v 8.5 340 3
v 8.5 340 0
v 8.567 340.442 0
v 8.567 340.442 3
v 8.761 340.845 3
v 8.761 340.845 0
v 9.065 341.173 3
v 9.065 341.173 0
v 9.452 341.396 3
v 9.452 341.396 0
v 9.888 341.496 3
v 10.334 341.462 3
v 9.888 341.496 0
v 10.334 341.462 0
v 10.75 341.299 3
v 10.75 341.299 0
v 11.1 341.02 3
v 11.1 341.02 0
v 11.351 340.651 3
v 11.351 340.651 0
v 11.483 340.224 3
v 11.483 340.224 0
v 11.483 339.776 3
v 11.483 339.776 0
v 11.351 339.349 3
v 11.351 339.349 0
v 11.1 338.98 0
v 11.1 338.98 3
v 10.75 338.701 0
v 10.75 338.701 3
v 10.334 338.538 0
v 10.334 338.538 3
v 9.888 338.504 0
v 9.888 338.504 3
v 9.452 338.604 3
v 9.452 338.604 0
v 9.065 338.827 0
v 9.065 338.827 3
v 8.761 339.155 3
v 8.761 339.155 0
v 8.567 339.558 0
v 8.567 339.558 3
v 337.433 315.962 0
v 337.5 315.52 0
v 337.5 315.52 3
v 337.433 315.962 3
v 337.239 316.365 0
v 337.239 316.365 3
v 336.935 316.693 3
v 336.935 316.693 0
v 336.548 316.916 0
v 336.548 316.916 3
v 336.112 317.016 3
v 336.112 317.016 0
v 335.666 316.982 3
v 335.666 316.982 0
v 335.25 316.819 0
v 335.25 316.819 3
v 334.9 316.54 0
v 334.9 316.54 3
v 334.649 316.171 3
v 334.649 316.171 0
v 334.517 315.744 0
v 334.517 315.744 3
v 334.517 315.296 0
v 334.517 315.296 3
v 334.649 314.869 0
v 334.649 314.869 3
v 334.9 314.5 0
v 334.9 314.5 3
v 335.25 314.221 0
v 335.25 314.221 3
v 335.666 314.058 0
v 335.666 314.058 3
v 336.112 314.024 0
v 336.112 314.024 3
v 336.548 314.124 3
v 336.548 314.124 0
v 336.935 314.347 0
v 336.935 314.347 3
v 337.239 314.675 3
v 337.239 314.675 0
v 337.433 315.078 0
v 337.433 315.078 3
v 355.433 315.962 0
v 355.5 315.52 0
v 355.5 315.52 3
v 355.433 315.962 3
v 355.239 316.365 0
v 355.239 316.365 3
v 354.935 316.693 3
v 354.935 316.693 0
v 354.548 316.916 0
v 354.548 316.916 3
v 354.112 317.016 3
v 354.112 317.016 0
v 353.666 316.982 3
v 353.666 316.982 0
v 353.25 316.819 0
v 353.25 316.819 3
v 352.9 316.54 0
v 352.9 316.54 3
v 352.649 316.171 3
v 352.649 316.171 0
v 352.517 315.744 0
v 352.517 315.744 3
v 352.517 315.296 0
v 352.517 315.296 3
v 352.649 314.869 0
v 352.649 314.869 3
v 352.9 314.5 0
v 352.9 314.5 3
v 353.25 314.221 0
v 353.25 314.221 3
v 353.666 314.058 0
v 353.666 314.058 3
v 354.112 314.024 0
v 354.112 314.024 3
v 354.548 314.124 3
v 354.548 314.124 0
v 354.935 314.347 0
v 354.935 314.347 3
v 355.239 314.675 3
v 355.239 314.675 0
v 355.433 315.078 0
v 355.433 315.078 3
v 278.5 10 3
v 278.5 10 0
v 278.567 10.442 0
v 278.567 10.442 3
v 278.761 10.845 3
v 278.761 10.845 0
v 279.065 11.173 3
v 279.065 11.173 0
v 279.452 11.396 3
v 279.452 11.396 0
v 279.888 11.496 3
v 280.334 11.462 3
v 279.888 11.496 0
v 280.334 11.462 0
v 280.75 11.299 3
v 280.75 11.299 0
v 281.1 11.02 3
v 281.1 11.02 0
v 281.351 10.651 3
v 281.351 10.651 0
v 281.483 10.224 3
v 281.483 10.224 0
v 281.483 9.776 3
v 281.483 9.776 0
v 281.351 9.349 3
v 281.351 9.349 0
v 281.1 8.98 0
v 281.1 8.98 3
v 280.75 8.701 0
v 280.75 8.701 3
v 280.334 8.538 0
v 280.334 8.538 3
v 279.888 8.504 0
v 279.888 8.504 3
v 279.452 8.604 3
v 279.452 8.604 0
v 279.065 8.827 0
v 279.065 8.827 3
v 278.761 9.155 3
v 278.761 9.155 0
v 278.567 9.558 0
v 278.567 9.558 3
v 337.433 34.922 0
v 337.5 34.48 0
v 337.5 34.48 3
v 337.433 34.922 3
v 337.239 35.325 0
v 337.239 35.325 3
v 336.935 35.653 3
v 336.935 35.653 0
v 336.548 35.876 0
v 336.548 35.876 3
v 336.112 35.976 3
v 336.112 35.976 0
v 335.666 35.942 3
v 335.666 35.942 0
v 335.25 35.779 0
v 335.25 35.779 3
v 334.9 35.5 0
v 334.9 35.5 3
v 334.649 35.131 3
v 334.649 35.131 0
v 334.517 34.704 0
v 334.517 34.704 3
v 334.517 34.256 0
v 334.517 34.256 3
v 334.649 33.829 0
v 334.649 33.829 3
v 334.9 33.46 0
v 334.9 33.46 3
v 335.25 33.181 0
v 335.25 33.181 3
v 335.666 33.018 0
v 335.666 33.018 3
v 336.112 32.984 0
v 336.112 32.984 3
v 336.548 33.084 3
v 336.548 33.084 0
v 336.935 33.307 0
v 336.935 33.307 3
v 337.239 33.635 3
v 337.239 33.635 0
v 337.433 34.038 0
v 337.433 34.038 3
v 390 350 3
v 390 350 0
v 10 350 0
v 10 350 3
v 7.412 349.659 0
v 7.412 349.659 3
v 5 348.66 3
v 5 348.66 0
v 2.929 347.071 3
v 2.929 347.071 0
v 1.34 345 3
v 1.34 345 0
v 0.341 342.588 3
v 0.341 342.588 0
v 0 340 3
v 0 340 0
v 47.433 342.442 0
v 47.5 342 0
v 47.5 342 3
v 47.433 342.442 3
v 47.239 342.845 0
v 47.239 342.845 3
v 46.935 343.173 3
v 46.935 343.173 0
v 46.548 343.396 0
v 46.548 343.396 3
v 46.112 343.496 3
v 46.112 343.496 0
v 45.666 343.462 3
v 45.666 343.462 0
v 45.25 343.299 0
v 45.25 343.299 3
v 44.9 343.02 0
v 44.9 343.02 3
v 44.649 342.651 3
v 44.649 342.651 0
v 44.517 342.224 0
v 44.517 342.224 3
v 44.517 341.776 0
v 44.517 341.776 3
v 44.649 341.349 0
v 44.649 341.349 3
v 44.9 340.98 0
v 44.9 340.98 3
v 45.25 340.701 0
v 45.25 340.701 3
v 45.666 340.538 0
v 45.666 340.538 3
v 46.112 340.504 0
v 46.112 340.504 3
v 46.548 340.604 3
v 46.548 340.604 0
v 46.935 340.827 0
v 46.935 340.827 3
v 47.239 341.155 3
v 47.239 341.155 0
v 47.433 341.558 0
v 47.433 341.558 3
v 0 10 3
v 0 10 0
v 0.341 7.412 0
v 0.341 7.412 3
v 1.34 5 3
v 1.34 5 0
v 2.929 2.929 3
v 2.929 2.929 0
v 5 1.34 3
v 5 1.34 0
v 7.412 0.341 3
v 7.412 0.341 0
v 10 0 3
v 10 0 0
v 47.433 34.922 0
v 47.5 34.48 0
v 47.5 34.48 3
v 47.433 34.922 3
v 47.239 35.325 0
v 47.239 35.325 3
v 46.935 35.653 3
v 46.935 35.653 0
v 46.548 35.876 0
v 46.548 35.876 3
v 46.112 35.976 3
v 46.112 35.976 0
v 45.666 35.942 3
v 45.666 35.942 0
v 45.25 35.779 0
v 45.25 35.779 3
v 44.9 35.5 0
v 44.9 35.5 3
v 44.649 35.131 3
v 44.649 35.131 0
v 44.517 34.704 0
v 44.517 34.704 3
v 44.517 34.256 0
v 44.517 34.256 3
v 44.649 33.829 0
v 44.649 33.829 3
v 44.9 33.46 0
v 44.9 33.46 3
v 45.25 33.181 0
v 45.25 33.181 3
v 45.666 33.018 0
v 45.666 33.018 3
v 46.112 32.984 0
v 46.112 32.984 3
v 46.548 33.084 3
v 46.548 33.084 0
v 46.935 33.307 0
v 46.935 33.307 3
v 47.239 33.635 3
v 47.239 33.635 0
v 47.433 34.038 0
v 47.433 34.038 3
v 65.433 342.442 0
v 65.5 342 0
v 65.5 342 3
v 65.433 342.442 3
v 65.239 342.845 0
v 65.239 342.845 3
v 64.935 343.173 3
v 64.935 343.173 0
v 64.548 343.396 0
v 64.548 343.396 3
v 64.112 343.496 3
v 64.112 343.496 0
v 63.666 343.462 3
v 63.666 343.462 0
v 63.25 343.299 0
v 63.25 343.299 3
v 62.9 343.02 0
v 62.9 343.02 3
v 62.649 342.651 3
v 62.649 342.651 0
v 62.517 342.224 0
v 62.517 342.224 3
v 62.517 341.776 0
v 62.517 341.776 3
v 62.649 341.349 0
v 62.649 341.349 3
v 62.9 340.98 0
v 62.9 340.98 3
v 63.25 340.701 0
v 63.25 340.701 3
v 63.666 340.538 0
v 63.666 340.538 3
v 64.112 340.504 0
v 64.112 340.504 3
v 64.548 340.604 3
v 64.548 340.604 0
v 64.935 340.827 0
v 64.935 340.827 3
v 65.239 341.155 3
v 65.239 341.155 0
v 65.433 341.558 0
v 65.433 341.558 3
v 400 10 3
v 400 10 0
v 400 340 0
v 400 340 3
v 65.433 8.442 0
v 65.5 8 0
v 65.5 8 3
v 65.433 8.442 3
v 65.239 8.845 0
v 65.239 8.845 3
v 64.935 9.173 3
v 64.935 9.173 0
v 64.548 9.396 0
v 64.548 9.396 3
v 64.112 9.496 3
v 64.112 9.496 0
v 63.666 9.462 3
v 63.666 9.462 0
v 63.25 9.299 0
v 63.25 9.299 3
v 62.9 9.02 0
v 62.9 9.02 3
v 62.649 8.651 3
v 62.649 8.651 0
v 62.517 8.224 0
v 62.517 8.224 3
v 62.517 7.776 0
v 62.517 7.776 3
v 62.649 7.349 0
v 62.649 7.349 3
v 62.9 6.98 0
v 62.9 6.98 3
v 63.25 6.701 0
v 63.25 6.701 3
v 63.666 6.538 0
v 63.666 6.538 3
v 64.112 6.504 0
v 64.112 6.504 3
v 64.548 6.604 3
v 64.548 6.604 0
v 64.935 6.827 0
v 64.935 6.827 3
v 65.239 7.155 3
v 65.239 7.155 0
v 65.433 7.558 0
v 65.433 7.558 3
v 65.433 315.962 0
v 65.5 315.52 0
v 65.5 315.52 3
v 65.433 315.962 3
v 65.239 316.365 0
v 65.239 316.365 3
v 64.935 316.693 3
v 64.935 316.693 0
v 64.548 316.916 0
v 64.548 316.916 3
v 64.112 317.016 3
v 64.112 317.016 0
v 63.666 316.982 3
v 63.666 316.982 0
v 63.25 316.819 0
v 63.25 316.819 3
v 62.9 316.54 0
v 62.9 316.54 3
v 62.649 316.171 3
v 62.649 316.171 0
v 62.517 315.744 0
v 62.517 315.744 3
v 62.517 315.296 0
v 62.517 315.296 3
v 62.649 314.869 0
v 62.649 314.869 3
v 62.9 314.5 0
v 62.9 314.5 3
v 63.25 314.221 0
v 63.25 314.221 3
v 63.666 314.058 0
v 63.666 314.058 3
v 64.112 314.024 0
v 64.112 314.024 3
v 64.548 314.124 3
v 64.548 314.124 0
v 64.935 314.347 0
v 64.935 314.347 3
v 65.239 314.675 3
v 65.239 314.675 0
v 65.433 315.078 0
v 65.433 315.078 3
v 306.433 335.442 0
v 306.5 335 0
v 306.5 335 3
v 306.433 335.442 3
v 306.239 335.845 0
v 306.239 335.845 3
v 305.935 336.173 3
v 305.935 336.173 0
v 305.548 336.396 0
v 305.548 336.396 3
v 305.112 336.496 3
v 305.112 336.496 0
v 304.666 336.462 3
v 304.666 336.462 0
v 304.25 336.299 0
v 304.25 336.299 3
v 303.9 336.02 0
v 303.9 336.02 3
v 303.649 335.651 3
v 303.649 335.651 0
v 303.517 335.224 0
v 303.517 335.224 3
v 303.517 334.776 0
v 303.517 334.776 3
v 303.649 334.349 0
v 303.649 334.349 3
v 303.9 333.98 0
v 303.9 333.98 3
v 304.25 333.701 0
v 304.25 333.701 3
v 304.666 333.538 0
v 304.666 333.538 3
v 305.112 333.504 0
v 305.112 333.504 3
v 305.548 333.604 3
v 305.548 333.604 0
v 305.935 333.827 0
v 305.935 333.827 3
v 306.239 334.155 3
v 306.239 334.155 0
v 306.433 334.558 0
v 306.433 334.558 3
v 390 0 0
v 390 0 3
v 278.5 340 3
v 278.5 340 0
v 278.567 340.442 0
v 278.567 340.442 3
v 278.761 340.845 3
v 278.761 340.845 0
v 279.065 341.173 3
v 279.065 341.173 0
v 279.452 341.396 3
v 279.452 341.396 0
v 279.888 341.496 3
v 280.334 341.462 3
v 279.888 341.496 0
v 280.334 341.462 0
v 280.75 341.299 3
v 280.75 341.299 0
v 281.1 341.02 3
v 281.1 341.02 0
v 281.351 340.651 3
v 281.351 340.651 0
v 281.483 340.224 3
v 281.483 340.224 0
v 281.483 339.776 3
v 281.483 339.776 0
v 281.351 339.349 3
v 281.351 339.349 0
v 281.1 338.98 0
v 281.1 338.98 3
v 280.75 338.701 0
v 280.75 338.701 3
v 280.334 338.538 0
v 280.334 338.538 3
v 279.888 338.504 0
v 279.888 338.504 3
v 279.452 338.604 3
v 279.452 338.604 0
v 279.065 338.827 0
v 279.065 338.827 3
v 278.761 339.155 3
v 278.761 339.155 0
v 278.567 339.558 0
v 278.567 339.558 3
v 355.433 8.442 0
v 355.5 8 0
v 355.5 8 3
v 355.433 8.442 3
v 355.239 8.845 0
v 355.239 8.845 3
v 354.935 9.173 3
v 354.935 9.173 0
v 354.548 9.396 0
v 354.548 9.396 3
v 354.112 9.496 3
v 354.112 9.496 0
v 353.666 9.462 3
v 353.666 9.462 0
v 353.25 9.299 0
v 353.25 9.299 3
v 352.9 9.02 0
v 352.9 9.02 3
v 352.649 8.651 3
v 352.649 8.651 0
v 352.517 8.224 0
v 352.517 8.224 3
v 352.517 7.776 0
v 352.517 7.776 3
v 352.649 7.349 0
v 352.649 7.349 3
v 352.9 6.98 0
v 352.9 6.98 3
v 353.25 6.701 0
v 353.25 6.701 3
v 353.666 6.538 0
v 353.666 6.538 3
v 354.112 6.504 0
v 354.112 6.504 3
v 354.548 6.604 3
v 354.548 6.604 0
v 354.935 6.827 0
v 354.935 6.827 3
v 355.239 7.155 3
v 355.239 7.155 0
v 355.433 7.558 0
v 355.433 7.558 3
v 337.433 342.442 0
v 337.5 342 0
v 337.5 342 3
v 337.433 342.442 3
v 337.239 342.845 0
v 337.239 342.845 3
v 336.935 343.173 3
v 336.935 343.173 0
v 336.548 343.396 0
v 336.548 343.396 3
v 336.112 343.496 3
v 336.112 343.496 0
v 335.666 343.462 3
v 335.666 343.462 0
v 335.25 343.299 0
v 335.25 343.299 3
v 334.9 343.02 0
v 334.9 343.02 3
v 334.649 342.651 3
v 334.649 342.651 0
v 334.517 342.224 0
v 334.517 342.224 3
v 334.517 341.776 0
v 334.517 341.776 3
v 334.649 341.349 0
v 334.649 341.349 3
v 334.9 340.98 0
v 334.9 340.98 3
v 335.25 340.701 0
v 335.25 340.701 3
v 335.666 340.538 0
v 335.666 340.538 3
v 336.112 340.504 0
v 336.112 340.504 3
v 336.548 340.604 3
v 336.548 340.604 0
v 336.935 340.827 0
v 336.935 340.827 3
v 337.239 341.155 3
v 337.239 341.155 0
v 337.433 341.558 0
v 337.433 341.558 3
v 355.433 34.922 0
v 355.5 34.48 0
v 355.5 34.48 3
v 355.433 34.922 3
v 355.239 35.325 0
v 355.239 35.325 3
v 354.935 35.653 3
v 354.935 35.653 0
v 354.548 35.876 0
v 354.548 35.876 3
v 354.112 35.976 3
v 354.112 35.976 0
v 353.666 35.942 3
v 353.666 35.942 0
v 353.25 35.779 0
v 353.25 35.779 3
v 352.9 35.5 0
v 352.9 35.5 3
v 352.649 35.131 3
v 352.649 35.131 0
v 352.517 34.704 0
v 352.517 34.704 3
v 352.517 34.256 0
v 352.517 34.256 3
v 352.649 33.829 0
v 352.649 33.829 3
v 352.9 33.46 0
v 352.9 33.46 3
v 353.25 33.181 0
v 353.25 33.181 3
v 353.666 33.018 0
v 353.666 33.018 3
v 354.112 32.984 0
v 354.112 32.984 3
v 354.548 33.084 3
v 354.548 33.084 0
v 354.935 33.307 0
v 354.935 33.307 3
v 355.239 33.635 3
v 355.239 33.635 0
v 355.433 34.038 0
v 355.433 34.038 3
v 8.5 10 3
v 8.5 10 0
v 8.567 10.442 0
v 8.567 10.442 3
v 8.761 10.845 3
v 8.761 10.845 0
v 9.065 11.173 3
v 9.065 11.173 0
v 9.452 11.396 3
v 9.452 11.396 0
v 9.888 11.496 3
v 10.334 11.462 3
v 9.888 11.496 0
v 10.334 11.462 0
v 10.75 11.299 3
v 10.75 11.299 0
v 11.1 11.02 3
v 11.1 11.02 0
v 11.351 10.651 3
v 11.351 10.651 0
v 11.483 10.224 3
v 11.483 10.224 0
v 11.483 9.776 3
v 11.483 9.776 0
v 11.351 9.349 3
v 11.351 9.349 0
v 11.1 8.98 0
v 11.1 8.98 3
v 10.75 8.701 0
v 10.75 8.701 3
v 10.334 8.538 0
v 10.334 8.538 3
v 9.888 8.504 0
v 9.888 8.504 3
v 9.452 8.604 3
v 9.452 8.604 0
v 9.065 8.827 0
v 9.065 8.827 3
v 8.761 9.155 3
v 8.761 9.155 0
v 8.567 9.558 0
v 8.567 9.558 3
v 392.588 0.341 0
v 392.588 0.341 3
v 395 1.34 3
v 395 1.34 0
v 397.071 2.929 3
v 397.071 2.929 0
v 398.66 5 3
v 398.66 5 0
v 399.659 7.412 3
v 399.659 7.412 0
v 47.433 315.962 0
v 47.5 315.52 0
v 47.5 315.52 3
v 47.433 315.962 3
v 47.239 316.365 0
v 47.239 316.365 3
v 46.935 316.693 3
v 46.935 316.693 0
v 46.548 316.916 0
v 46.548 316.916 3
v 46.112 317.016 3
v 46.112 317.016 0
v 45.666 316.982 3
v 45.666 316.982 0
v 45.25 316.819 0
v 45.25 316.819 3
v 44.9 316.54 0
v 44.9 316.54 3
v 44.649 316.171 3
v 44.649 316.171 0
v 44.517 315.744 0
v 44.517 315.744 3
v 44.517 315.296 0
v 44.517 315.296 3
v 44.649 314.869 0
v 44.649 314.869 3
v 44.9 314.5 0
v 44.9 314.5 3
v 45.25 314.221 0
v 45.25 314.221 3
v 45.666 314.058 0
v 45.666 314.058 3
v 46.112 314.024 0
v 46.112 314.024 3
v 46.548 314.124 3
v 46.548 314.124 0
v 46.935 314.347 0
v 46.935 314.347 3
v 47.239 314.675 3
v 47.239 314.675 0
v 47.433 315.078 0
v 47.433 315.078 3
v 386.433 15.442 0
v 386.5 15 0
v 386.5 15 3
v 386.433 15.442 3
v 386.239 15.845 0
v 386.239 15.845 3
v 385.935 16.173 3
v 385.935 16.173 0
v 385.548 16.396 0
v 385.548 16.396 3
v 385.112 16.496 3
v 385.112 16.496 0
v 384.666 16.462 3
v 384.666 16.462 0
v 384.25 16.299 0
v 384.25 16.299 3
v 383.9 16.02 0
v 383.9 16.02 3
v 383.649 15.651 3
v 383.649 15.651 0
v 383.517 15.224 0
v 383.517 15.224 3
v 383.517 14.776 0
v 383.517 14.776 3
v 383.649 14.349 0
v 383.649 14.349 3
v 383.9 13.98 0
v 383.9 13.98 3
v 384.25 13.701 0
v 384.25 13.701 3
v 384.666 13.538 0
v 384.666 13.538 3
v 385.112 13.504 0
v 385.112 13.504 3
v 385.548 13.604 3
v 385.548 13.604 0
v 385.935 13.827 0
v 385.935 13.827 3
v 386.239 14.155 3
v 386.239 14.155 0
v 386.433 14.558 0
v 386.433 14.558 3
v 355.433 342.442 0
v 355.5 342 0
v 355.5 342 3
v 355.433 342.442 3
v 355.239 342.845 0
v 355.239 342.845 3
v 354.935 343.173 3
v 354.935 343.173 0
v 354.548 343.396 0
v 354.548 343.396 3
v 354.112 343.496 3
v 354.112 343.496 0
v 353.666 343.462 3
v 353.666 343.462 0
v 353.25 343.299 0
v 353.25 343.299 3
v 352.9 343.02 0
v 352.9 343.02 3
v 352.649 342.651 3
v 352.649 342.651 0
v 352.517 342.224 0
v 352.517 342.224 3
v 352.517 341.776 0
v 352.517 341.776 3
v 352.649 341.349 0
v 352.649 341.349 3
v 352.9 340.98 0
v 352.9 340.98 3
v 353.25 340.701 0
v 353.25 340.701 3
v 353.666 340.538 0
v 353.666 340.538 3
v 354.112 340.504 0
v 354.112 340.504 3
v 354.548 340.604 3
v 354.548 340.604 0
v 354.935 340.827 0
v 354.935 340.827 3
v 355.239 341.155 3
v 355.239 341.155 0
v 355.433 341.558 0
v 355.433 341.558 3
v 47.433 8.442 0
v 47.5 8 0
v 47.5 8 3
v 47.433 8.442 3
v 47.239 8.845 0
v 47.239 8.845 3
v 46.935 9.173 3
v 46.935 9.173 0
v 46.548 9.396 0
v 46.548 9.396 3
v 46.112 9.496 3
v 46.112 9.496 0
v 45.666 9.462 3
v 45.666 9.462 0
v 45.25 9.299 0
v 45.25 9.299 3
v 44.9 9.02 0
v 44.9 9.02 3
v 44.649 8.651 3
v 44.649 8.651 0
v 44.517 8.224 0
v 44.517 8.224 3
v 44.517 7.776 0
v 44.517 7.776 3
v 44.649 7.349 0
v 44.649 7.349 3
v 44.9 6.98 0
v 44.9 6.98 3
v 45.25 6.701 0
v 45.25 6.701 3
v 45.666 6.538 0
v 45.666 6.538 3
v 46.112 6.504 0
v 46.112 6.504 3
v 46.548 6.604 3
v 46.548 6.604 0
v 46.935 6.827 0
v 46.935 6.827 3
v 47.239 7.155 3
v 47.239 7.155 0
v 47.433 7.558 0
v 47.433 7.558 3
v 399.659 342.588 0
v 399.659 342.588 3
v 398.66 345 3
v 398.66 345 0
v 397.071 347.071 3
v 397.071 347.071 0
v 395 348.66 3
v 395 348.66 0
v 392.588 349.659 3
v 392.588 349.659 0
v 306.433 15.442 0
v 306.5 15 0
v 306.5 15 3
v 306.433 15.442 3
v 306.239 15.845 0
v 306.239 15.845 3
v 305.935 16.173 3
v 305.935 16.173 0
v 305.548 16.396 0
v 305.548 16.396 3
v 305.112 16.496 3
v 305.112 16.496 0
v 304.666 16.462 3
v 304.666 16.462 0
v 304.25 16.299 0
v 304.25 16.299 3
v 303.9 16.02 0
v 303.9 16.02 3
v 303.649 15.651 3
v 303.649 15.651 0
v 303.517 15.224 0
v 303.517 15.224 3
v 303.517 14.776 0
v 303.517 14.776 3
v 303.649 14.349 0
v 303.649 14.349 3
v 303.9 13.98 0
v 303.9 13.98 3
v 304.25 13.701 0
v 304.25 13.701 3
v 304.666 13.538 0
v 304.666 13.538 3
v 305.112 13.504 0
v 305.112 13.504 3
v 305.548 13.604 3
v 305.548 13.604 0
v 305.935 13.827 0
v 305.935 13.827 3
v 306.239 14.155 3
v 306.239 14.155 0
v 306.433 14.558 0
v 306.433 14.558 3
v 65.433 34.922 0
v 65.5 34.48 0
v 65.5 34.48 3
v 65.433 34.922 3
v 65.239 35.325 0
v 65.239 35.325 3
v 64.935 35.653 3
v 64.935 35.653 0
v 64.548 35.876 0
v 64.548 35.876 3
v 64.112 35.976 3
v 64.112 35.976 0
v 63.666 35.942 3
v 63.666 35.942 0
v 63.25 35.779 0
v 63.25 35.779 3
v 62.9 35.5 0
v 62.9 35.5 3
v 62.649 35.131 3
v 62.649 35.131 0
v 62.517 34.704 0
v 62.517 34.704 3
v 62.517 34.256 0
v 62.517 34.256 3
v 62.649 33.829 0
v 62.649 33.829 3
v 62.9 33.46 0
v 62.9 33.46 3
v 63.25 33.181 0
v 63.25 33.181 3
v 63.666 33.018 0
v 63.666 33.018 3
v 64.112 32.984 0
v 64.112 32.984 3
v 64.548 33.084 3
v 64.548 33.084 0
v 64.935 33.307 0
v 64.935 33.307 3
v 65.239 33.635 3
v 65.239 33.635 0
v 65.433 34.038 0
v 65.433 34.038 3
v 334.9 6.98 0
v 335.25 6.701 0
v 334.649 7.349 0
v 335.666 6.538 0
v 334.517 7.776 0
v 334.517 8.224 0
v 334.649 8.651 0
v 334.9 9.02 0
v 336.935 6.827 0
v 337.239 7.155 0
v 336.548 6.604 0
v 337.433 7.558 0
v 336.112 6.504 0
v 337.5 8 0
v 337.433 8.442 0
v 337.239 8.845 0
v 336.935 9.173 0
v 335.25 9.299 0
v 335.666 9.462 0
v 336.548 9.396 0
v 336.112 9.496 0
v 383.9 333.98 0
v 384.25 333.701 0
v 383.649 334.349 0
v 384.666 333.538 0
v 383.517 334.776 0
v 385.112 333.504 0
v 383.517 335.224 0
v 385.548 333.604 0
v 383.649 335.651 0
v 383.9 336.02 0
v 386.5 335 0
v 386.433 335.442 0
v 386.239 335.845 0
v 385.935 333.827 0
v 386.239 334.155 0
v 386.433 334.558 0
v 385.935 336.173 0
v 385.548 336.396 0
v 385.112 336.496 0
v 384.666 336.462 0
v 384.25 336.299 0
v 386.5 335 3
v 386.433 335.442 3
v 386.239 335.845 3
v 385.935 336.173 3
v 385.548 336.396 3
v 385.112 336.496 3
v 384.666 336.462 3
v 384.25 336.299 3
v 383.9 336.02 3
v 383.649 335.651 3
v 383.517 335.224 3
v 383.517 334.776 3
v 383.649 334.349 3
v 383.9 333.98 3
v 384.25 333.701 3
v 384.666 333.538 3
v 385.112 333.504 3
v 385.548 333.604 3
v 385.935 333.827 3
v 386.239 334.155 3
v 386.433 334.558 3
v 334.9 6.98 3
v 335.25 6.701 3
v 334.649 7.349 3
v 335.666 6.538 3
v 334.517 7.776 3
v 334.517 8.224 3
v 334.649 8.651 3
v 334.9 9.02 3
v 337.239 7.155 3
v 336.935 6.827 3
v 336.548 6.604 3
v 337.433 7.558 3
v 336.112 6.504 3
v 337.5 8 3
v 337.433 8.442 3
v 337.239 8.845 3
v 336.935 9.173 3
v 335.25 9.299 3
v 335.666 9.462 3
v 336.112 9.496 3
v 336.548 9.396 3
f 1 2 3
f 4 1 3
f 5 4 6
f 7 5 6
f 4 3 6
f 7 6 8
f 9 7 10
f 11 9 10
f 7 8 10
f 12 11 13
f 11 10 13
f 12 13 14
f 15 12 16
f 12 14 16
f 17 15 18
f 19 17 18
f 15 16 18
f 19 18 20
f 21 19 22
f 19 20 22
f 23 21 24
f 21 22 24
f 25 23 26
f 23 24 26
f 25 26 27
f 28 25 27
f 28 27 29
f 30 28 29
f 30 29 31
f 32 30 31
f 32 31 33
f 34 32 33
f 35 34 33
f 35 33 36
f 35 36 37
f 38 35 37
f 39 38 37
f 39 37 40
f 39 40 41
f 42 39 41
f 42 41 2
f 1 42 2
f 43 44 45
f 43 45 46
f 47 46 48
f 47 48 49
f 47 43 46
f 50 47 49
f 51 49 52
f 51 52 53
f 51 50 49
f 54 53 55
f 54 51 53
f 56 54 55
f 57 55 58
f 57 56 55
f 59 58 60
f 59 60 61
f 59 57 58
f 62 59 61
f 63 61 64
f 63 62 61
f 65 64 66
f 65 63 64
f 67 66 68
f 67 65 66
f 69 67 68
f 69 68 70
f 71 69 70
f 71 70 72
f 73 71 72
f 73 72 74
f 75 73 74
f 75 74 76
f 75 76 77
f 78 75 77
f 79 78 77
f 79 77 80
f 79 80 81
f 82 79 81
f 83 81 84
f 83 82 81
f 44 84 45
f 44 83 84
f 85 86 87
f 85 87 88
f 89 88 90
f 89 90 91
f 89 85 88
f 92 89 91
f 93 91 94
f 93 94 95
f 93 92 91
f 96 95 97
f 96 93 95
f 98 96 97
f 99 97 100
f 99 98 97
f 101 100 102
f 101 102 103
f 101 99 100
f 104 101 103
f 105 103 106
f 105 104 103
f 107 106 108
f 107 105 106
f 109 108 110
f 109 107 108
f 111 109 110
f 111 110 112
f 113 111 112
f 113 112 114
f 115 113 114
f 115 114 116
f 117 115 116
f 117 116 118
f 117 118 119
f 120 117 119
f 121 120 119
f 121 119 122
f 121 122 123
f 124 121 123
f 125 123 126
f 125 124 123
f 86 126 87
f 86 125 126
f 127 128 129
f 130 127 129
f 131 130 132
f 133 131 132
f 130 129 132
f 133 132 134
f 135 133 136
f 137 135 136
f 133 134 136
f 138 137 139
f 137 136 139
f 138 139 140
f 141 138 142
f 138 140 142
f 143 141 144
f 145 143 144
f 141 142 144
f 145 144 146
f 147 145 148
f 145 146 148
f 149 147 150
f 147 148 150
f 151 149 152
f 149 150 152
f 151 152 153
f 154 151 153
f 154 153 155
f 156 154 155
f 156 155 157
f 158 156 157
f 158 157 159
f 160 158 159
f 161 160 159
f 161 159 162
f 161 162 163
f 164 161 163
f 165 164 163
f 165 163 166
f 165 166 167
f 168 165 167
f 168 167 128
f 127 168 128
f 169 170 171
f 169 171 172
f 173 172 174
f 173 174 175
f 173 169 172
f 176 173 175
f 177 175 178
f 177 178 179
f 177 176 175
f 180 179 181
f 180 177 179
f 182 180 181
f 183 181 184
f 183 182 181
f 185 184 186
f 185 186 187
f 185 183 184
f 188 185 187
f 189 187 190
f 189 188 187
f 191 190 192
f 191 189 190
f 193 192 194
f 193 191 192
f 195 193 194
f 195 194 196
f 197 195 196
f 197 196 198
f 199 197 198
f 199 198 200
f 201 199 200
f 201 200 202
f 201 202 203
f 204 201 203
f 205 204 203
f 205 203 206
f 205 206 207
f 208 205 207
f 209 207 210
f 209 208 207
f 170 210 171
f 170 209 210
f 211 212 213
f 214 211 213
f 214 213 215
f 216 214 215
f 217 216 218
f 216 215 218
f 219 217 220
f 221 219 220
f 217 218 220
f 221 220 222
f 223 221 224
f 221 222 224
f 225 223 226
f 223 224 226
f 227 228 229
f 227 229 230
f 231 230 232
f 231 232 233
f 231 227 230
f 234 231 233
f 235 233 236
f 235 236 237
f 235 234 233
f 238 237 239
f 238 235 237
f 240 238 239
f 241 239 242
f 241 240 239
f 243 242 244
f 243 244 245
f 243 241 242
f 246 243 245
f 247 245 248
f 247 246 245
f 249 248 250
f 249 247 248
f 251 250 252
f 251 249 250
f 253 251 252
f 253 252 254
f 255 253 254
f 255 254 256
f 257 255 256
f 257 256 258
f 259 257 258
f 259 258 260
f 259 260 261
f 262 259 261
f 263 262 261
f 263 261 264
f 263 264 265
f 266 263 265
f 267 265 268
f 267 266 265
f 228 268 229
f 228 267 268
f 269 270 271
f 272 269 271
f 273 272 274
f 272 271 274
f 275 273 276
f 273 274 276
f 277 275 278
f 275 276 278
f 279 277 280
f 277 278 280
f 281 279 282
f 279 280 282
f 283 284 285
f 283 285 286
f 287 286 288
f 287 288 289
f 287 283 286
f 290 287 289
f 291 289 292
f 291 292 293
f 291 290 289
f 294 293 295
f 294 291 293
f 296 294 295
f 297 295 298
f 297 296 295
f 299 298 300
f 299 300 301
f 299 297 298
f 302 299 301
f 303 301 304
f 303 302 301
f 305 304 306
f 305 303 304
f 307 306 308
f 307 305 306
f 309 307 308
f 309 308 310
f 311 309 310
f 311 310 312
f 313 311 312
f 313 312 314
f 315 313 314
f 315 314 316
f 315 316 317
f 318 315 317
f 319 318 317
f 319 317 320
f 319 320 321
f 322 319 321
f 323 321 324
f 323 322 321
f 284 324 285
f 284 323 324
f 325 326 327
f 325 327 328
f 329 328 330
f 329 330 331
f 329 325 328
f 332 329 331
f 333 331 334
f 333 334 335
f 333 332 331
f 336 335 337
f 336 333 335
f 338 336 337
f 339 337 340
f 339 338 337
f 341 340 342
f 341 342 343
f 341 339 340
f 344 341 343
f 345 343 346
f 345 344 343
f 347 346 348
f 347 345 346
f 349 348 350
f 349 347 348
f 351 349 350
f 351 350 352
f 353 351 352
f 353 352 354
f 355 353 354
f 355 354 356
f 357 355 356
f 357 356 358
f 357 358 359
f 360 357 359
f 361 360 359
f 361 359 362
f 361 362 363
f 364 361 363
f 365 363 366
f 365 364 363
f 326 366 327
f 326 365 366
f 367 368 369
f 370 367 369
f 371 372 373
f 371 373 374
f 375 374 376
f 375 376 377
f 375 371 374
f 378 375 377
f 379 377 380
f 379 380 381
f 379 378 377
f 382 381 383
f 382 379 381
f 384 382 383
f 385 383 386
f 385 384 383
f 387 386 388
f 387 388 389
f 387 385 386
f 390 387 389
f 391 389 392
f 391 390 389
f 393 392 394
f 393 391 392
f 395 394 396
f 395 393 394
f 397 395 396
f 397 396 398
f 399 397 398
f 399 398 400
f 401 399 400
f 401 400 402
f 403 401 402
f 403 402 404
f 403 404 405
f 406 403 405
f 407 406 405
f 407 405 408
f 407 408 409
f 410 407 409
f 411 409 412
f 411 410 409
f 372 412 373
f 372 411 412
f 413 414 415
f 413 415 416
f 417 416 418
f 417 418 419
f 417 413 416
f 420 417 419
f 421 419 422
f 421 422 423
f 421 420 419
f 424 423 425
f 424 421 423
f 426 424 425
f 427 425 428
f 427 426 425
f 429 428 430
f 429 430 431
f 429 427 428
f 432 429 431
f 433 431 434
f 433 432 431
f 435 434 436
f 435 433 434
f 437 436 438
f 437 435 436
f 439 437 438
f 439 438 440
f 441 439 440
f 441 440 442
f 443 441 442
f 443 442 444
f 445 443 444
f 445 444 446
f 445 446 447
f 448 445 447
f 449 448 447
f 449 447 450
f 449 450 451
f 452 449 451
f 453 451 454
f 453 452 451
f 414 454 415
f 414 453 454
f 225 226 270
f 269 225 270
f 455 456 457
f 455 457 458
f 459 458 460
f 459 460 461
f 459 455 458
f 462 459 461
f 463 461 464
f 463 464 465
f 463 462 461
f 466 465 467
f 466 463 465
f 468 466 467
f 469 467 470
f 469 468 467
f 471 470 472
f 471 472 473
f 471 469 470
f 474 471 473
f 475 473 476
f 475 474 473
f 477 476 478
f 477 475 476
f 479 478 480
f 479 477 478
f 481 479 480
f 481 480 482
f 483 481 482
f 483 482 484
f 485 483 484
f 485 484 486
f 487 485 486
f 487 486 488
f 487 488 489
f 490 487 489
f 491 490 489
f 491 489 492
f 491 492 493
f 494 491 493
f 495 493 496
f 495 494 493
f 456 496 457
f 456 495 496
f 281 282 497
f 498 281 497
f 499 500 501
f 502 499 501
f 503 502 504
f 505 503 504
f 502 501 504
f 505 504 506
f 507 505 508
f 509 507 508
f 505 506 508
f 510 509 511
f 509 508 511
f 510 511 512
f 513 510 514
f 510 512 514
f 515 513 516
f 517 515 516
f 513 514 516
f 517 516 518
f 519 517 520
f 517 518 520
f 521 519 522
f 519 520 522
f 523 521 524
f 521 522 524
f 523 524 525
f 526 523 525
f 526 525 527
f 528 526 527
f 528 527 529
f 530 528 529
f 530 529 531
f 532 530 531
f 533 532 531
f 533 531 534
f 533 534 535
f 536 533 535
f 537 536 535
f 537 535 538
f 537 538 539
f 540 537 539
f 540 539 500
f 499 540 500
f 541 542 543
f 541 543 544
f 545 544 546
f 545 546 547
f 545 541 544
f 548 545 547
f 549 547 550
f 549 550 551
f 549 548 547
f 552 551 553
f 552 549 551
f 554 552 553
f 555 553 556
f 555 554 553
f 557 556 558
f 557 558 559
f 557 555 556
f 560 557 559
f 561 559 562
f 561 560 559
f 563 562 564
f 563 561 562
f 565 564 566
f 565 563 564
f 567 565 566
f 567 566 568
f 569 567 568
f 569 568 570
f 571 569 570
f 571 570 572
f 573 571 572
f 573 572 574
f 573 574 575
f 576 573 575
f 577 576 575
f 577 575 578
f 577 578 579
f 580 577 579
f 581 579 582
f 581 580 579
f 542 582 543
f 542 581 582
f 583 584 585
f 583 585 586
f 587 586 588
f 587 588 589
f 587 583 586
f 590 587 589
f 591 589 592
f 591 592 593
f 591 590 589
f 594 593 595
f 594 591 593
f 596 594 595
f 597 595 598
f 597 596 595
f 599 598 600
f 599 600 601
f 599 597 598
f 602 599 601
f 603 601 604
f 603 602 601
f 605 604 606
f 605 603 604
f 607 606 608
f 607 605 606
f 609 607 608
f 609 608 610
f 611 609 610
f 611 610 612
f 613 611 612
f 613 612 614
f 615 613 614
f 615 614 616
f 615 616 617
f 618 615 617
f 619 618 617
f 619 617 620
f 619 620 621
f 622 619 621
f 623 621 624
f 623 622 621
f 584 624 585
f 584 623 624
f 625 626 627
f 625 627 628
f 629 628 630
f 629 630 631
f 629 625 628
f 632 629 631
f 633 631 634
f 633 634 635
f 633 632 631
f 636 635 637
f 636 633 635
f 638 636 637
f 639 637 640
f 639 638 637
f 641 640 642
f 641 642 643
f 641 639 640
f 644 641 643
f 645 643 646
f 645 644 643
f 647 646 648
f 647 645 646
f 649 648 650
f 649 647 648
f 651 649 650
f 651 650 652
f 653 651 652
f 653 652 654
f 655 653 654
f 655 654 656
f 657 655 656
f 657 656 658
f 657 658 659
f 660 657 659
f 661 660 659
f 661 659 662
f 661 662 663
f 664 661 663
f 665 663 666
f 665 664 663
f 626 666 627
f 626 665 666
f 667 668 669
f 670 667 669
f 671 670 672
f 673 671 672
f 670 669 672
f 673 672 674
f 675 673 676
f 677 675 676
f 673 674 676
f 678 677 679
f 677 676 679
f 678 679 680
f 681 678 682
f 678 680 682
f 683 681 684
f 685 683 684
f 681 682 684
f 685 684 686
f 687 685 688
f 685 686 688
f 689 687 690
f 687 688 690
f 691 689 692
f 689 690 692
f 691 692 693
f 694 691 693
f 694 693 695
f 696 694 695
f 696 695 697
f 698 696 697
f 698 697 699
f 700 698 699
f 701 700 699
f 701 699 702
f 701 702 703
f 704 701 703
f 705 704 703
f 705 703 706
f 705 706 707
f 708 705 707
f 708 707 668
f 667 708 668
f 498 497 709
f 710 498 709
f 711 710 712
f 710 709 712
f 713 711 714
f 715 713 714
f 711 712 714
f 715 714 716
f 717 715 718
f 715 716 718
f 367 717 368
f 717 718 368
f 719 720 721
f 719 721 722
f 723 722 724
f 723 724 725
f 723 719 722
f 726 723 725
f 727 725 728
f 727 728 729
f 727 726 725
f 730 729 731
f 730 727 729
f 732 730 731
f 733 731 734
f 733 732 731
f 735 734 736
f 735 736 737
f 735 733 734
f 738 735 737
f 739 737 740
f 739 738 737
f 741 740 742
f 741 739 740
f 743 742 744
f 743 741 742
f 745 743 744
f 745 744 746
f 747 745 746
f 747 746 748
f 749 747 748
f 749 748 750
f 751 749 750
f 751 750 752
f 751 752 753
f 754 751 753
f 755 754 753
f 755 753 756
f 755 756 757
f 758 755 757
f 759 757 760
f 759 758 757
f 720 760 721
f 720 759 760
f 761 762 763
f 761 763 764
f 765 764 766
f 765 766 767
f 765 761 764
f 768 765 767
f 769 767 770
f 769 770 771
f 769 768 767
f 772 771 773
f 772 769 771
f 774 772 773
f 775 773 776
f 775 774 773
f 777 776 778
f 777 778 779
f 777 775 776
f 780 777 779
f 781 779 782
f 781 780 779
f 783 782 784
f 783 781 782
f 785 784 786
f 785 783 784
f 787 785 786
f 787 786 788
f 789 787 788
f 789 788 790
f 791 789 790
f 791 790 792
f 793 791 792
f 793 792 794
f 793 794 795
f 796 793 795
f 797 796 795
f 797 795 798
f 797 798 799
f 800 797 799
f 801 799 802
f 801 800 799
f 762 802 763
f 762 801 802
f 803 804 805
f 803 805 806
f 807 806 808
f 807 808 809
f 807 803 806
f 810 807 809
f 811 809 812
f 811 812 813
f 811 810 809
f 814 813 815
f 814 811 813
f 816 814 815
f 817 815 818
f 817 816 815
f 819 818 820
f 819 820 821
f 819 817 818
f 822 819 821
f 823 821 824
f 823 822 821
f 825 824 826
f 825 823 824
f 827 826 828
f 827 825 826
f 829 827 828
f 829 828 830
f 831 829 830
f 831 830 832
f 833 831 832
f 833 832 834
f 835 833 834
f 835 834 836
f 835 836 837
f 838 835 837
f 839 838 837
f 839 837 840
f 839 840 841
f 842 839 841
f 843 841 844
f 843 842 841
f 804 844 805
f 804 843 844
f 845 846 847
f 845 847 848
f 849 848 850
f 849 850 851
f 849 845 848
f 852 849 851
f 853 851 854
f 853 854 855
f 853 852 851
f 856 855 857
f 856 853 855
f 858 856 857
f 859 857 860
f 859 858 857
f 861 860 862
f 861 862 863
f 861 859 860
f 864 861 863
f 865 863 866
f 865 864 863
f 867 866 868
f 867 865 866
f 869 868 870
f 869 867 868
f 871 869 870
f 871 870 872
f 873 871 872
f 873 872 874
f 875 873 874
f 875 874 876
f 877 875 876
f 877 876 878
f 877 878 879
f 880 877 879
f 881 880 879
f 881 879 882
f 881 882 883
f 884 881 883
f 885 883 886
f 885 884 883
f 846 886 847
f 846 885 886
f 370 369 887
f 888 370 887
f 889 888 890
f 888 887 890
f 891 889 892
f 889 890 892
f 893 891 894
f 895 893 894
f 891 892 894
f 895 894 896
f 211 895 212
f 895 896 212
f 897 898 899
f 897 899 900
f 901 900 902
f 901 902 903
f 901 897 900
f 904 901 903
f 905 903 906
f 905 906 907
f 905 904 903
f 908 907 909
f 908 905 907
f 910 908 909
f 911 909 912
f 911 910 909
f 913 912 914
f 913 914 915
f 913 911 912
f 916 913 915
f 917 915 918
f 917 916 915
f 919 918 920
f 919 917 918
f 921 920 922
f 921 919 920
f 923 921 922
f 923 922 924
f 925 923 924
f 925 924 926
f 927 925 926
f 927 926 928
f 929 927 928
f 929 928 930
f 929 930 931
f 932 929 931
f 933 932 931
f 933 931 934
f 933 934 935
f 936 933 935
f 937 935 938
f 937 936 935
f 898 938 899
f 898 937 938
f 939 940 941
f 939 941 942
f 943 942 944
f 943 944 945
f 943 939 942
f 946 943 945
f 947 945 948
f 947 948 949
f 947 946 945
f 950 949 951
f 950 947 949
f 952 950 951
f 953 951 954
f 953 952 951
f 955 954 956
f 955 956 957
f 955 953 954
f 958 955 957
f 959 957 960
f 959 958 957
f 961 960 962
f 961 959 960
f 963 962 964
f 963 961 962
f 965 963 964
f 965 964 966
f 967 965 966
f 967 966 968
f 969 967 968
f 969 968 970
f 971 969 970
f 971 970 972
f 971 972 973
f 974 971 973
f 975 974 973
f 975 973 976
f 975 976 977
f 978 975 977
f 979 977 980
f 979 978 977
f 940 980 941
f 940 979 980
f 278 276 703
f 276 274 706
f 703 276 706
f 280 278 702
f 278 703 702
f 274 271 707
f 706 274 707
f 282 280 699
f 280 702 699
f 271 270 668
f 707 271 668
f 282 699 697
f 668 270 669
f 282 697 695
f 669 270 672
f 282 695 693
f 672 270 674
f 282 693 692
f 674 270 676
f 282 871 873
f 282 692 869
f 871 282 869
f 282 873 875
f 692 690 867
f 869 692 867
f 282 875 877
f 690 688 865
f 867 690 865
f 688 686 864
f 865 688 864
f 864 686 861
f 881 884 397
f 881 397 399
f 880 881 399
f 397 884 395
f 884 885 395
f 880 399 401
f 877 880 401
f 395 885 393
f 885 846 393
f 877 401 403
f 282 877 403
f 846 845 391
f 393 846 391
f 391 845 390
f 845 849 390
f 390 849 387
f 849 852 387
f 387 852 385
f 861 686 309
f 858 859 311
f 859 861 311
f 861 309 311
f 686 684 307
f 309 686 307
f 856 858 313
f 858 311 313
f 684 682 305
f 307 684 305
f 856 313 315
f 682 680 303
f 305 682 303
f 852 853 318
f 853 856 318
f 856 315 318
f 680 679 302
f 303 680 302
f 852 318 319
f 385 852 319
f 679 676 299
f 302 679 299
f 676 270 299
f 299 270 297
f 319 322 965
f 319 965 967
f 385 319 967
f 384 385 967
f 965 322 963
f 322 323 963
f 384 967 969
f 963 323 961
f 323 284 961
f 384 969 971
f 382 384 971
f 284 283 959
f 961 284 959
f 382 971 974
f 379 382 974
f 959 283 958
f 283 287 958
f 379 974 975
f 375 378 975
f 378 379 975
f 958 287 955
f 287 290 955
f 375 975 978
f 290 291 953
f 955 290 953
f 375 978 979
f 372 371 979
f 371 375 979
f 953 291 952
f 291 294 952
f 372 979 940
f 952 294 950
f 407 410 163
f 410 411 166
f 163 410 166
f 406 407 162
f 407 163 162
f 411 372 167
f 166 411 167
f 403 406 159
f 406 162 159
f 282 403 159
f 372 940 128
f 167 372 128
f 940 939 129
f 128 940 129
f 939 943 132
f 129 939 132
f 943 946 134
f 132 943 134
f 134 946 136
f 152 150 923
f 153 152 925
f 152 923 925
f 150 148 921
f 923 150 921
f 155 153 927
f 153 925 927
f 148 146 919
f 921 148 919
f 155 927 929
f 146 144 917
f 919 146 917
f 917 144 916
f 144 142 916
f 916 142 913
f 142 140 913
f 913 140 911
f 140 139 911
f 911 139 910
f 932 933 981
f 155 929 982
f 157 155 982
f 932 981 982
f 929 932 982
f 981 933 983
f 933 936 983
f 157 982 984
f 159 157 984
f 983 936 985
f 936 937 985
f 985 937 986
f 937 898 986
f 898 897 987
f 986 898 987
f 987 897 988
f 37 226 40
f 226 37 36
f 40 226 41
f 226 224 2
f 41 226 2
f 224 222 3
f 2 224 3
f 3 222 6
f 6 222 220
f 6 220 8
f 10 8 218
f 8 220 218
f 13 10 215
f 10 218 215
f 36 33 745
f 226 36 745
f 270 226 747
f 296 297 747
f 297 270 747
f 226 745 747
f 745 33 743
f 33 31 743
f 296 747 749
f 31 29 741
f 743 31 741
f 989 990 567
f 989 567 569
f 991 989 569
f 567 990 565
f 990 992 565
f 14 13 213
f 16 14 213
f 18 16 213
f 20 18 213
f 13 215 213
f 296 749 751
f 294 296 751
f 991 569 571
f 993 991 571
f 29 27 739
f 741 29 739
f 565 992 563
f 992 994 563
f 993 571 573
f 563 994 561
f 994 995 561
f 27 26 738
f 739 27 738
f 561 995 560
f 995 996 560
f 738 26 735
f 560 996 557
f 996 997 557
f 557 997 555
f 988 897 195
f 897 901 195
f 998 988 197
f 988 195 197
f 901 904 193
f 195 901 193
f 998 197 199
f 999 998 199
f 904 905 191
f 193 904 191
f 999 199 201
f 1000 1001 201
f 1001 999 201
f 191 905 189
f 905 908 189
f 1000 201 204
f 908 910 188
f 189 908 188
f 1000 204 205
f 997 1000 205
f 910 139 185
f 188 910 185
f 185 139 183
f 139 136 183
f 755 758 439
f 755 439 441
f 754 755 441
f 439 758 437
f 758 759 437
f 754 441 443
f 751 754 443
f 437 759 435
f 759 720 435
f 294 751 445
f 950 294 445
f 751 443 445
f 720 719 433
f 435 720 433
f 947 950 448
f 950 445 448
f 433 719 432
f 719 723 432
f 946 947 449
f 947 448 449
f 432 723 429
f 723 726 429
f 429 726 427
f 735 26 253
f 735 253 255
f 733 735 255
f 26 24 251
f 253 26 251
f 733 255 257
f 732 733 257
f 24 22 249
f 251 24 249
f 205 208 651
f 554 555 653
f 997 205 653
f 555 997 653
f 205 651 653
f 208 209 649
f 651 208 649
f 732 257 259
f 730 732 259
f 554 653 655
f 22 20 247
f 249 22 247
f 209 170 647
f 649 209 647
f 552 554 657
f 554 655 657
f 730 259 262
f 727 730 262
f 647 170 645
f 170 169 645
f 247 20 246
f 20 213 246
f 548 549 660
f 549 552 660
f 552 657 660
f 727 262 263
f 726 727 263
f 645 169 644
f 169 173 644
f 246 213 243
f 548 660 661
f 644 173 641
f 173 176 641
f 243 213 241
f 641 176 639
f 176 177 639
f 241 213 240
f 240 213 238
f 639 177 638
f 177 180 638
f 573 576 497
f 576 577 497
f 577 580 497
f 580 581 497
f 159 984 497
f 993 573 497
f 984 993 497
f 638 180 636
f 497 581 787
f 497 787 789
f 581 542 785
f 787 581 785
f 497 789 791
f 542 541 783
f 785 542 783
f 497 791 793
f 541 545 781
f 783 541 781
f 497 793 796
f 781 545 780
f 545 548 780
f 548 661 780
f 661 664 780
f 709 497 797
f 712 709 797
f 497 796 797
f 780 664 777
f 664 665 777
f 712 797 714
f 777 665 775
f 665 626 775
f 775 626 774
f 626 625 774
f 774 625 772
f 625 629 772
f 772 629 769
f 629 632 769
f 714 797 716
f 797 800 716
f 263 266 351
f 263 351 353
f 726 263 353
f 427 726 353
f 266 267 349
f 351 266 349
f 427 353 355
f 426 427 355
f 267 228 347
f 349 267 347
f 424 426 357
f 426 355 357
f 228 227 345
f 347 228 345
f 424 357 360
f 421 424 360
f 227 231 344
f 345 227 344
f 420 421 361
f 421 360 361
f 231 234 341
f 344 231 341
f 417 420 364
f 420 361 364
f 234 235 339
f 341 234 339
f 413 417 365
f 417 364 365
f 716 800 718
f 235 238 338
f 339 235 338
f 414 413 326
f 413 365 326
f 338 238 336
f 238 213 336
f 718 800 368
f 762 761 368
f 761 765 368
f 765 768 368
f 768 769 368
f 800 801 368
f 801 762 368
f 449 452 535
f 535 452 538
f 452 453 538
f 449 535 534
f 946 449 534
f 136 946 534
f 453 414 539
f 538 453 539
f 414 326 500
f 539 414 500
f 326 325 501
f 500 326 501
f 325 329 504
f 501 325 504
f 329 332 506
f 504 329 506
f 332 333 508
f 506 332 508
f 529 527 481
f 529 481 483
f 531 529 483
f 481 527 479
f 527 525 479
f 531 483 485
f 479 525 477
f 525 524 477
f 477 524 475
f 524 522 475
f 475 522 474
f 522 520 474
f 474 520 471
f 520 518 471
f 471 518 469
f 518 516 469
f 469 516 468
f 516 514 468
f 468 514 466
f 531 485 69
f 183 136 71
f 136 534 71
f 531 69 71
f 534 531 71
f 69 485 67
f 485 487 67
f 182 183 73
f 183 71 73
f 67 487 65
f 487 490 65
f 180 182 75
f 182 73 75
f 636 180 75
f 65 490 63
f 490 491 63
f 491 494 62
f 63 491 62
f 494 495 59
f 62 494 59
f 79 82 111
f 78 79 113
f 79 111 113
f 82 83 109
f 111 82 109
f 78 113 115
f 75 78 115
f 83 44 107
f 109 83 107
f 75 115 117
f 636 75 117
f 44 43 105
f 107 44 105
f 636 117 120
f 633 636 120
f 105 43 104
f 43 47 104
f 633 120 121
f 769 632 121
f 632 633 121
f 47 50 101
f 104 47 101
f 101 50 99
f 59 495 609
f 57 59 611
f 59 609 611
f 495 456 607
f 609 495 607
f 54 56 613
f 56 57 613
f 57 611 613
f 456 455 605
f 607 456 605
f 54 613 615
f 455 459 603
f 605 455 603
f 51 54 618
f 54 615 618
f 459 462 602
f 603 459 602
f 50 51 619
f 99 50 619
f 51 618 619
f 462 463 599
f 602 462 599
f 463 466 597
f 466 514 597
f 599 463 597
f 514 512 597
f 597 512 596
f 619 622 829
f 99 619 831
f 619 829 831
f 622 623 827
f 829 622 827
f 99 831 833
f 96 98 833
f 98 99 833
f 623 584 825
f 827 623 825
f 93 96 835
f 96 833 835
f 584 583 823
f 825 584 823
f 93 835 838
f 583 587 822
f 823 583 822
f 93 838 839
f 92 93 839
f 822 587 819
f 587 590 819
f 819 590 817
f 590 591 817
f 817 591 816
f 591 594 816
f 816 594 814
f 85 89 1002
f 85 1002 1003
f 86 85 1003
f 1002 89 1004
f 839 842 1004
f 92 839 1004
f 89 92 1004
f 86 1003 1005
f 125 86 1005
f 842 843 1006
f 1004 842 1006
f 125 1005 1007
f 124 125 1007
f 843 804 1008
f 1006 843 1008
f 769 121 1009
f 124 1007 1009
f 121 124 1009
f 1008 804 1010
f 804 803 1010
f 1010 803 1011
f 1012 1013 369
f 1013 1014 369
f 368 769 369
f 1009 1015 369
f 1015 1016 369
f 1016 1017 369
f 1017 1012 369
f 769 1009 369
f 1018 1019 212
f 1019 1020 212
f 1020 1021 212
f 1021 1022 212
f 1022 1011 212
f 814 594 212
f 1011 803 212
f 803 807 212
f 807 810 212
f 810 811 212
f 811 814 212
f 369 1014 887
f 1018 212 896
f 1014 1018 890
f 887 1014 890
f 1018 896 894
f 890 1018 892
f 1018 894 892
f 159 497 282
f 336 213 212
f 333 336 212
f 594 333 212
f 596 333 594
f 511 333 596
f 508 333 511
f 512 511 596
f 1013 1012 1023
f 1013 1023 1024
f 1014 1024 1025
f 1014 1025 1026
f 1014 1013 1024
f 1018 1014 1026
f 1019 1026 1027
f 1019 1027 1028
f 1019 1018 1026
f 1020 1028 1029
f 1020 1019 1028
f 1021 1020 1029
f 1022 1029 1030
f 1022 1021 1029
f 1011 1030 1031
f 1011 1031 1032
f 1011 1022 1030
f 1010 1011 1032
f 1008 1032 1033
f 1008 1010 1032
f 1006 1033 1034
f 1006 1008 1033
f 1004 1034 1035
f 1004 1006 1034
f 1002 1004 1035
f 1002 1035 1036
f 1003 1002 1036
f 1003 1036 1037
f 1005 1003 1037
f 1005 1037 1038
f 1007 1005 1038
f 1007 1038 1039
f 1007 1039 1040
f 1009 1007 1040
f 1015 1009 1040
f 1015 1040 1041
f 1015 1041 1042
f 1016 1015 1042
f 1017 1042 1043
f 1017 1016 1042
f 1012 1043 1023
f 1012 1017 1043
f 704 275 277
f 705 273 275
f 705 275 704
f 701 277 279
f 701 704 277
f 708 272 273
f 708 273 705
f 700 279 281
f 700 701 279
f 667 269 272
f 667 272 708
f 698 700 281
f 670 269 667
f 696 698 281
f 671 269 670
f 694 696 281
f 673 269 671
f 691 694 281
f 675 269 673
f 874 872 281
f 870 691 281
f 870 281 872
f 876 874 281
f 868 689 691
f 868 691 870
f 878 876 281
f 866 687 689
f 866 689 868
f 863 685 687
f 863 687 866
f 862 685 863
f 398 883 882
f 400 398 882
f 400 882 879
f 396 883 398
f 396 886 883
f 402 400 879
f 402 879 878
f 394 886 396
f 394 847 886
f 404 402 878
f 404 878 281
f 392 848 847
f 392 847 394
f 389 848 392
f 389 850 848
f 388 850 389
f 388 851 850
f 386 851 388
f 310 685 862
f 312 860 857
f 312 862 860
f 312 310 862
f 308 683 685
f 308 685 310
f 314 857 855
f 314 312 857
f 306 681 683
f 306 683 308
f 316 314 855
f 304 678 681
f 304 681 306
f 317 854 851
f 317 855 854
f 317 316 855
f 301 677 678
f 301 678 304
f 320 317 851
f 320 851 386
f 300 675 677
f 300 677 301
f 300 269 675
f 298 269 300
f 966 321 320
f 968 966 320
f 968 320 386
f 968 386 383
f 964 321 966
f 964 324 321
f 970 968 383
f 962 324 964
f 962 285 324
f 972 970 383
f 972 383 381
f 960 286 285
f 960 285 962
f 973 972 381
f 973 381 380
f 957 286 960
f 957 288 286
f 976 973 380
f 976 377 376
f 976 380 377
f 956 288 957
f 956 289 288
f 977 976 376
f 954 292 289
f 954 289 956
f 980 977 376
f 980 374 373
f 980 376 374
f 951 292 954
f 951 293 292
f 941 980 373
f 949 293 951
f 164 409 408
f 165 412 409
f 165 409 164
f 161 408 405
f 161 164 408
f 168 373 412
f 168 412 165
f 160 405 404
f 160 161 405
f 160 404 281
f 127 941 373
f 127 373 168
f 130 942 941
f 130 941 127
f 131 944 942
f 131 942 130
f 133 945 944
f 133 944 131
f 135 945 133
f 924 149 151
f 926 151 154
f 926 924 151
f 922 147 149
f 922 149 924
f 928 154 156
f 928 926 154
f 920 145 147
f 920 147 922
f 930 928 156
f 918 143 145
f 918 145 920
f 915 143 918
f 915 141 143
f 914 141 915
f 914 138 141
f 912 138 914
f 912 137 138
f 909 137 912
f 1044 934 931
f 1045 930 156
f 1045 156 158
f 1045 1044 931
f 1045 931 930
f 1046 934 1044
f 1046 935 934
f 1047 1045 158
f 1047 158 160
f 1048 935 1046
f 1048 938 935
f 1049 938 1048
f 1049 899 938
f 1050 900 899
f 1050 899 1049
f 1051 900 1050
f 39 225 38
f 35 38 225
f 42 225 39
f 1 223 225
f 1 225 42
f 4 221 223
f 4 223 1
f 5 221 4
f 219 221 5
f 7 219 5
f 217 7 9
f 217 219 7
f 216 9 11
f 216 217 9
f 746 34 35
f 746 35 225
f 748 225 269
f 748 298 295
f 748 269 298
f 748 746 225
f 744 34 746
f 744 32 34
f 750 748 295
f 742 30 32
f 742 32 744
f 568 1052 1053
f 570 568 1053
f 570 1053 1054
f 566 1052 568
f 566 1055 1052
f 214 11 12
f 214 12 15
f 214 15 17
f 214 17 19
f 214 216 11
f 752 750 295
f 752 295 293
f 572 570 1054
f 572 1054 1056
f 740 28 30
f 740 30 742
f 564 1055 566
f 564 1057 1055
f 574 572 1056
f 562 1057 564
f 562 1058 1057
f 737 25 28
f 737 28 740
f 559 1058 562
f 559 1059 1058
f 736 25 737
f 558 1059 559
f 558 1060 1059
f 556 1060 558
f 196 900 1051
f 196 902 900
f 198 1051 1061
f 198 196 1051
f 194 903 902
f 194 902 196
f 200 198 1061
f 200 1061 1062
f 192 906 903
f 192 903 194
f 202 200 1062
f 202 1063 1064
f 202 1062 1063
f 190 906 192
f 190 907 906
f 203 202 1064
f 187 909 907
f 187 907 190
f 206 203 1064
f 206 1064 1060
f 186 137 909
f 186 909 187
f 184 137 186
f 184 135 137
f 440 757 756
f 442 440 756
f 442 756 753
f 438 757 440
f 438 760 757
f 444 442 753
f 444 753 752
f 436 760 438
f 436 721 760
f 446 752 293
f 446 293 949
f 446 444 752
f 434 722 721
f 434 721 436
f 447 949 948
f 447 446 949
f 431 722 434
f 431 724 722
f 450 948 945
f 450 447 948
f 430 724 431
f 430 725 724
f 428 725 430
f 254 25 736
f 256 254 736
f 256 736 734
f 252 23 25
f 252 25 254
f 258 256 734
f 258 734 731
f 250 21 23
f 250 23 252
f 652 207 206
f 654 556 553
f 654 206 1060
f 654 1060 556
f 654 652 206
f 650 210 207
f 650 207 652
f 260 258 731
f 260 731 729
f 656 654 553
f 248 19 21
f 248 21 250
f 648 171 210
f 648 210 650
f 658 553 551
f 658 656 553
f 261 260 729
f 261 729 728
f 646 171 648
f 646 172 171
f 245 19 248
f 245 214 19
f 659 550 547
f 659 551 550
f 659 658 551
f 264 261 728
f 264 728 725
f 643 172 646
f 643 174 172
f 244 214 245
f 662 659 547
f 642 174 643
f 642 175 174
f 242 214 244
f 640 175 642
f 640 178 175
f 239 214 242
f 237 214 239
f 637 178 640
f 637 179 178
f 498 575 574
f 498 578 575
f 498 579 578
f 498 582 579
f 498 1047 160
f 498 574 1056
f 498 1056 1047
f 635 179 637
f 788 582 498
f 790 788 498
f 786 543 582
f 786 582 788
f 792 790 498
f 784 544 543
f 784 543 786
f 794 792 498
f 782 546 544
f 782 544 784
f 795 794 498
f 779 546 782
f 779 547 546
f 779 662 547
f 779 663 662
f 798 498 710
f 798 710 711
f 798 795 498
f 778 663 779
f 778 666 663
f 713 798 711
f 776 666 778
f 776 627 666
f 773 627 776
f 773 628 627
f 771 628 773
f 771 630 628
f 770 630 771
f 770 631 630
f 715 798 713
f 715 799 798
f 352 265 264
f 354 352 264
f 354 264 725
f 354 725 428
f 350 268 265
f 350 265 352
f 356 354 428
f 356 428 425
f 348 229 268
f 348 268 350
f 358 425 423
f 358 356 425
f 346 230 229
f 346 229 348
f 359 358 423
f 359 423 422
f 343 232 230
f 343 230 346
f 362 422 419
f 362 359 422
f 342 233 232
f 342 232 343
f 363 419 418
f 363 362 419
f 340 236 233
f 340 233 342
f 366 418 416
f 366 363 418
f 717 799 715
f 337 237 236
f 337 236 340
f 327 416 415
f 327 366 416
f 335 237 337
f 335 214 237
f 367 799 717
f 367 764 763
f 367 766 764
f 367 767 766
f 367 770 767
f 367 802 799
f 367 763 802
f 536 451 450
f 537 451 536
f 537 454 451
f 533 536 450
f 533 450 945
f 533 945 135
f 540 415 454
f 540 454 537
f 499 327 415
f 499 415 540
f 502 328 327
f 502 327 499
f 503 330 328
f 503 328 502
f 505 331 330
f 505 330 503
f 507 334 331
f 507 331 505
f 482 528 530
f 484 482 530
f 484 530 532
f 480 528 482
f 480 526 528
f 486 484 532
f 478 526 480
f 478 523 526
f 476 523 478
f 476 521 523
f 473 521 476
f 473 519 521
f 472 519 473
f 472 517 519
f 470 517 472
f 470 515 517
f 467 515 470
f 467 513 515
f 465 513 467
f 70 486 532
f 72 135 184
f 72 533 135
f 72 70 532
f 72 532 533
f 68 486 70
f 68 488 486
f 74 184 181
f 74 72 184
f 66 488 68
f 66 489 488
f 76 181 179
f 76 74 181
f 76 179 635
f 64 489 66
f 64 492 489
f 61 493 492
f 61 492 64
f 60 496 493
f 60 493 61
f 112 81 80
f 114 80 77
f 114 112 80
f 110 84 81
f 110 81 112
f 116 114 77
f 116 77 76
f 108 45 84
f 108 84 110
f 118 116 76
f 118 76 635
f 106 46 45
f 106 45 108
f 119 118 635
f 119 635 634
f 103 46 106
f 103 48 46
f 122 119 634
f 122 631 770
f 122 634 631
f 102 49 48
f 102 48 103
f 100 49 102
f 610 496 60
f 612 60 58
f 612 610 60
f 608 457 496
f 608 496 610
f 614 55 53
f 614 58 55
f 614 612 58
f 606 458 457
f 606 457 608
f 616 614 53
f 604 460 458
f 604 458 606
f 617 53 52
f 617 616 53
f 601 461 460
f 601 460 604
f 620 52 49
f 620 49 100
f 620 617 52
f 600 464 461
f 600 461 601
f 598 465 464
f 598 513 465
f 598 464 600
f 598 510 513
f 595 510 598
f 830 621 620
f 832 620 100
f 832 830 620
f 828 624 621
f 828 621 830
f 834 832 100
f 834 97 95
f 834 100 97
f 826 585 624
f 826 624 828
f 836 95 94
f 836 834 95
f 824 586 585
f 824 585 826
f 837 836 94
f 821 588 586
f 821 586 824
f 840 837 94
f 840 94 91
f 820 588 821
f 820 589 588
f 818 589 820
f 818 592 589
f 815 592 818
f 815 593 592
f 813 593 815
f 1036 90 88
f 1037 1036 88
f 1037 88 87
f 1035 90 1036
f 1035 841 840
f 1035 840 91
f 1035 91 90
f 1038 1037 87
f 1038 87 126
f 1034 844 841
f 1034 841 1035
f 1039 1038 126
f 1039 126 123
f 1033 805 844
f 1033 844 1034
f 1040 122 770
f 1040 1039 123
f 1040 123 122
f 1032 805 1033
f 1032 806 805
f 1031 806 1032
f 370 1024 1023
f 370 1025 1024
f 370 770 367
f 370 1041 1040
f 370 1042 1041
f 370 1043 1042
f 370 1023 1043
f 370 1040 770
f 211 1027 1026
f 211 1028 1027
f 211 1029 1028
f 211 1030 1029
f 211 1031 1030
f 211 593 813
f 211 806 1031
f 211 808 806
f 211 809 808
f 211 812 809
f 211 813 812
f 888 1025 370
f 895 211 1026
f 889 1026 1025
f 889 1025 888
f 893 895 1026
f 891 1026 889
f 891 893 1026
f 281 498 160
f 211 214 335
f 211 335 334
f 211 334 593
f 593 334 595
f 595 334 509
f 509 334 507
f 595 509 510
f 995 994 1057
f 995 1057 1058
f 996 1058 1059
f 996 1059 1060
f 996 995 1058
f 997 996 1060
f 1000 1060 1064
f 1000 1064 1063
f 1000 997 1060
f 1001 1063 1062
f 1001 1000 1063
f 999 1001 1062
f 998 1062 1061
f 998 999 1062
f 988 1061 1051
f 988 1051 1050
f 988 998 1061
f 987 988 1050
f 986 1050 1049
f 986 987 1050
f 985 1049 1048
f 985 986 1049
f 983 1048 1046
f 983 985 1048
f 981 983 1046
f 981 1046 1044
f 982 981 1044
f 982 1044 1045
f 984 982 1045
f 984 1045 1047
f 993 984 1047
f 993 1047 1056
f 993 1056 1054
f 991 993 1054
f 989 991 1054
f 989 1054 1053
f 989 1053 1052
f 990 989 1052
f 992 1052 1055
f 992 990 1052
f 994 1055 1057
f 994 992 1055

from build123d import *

# Parameters (mm, degrees)
ESQUISSE1_R             = 1.5
BOSS_EXTRU_2_DEPTH      = 3
ESQUISSE2_R             = 1.5
ENL_V_MAT_EXTRU_1_DEPTH = 10


with BuildPart() as part:
    # Esquisse1 → Boss.-Extru.2 (new body)
    with BuildSketch(Plane.XY):
        with BuildLine():
            Line((10, 0), (390, 0))
            ThreePointArc((390, 0), (397.071067812, 2.928932188), (400, 10))
            Line((400, 10), (400, 340))
            ThreePointArc((400, 340), (397.071067812, 347.071067812), (390, 350))
            Line((390, 350), (10, 350))
            ThreePointArc((10, 350), (2.928932188, 347.071067812), (0, 340))
            Line((0, 340), (0, 10))
            ThreePointArc((0, 10), (2.928932188, 2.928932188), (10, 0))
        make_face()
        with Locations((385, 15)):
            Circle(ESQUISSE1_R, mode=Mode.SUBTRACT)
        with Locations((305, 15)):
            Circle(ESQUISSE1_R, mode=Mode.SUBTRACT)
        with Locations((305, 335)):
            Circle(ESQUISSE1_R, mode=Mode.SUBTRACT)
        with Locations((385, 335)):
            Circle(ESQUISSE1_R, mode=Mode.SUBTRACT)
        with Locations((354, 8)):
            Circle(ESQUISSE1_R, mode=Mode.SUBTRACT)
        with Locations((336, 8)):
            Circle(ESQUISSE1_R, mode=Mode.SUBTRACT)
        with Locations((336, 34.48)):
            Circle(ESQUISSE1_R, mode=Mode.SUBTRACT)
        with Locations((354, 34.48)):
            Circle(ESQUISSE1_R, mode=Mode.SUBTRACT)
        with Locations((336, 342)):
            Circle(ESQUISSE1_R, mode=Mode.SUBTRACT)
        with Locations((336, 315.52)):
            Circle(ESQUISSE1_R, mode=Mode.SUBTRACT)
        with Locations((354, 315.52)):
            Circle(ESQUISSE1_R, mode=Mode.SUBTRACT)
        with Locations((354, 342)):
            Circle(ESQUISSE1_R, mode=Mode.SUBTRACT)
        with Locations((64, 34.48)):
            Circle(ESQUISSE1_R, mode=Mode.SUBTRACT)
        with Locations((46, 34.48)):
            Circle(ESQUISSE1_R, mode=Mode.SUBTRACT)
        with Locations((46, 8)):
            Circle(ESQUISSE1_R, mode=Mode.SUBTRACT)
        with Locations((64, 8)):
            Circle(ESQUISSE1_R, mode=Mode.SUBTRACT)
        with Locations((46, 315.52)):
            Circle(ESQUISSE1_R, mode=Mode.SUBTRACT)
        with Locations((46, 342)):
            Circle(ESQUISSE1_R, mode=Mode.SUBTRACT)
        with Locations((64, 342)):
            Circle(ESQUISSE1_R, mode=Mode.SUBTRACT)
        with Locations((64, 315.52)):
            Circle(ESQUISSE1_R, mode=Mode.SUBTRACT)
    extrude(amount=BOSS_EXTRU_2_DEPTH)

    # Esquisse2 → Enlèv. mat.-Extru.1 (cut)
    with BuildSketch(Plane(origin=(0, 0, 0), x_dir=(-1, 0, 0), z_dir=(0, 0, -1))):
        with Locations((-10, 10)):
            Circle(ESQUISSE2_R)
        with Locations((-10, 340)):
            Circle(ESQUISSE2_R)
        with Locations((-280, 340)):
            Circle(ESQUISSE2_R)
        with Locations((-280, 10)):
            Circle(ESQUISSE2_R)
    extrude(amount=-ENL_V_MAT_EXTRU_1_DEPTH, mode=Mode.SUBTRACT)


solid = part.part
